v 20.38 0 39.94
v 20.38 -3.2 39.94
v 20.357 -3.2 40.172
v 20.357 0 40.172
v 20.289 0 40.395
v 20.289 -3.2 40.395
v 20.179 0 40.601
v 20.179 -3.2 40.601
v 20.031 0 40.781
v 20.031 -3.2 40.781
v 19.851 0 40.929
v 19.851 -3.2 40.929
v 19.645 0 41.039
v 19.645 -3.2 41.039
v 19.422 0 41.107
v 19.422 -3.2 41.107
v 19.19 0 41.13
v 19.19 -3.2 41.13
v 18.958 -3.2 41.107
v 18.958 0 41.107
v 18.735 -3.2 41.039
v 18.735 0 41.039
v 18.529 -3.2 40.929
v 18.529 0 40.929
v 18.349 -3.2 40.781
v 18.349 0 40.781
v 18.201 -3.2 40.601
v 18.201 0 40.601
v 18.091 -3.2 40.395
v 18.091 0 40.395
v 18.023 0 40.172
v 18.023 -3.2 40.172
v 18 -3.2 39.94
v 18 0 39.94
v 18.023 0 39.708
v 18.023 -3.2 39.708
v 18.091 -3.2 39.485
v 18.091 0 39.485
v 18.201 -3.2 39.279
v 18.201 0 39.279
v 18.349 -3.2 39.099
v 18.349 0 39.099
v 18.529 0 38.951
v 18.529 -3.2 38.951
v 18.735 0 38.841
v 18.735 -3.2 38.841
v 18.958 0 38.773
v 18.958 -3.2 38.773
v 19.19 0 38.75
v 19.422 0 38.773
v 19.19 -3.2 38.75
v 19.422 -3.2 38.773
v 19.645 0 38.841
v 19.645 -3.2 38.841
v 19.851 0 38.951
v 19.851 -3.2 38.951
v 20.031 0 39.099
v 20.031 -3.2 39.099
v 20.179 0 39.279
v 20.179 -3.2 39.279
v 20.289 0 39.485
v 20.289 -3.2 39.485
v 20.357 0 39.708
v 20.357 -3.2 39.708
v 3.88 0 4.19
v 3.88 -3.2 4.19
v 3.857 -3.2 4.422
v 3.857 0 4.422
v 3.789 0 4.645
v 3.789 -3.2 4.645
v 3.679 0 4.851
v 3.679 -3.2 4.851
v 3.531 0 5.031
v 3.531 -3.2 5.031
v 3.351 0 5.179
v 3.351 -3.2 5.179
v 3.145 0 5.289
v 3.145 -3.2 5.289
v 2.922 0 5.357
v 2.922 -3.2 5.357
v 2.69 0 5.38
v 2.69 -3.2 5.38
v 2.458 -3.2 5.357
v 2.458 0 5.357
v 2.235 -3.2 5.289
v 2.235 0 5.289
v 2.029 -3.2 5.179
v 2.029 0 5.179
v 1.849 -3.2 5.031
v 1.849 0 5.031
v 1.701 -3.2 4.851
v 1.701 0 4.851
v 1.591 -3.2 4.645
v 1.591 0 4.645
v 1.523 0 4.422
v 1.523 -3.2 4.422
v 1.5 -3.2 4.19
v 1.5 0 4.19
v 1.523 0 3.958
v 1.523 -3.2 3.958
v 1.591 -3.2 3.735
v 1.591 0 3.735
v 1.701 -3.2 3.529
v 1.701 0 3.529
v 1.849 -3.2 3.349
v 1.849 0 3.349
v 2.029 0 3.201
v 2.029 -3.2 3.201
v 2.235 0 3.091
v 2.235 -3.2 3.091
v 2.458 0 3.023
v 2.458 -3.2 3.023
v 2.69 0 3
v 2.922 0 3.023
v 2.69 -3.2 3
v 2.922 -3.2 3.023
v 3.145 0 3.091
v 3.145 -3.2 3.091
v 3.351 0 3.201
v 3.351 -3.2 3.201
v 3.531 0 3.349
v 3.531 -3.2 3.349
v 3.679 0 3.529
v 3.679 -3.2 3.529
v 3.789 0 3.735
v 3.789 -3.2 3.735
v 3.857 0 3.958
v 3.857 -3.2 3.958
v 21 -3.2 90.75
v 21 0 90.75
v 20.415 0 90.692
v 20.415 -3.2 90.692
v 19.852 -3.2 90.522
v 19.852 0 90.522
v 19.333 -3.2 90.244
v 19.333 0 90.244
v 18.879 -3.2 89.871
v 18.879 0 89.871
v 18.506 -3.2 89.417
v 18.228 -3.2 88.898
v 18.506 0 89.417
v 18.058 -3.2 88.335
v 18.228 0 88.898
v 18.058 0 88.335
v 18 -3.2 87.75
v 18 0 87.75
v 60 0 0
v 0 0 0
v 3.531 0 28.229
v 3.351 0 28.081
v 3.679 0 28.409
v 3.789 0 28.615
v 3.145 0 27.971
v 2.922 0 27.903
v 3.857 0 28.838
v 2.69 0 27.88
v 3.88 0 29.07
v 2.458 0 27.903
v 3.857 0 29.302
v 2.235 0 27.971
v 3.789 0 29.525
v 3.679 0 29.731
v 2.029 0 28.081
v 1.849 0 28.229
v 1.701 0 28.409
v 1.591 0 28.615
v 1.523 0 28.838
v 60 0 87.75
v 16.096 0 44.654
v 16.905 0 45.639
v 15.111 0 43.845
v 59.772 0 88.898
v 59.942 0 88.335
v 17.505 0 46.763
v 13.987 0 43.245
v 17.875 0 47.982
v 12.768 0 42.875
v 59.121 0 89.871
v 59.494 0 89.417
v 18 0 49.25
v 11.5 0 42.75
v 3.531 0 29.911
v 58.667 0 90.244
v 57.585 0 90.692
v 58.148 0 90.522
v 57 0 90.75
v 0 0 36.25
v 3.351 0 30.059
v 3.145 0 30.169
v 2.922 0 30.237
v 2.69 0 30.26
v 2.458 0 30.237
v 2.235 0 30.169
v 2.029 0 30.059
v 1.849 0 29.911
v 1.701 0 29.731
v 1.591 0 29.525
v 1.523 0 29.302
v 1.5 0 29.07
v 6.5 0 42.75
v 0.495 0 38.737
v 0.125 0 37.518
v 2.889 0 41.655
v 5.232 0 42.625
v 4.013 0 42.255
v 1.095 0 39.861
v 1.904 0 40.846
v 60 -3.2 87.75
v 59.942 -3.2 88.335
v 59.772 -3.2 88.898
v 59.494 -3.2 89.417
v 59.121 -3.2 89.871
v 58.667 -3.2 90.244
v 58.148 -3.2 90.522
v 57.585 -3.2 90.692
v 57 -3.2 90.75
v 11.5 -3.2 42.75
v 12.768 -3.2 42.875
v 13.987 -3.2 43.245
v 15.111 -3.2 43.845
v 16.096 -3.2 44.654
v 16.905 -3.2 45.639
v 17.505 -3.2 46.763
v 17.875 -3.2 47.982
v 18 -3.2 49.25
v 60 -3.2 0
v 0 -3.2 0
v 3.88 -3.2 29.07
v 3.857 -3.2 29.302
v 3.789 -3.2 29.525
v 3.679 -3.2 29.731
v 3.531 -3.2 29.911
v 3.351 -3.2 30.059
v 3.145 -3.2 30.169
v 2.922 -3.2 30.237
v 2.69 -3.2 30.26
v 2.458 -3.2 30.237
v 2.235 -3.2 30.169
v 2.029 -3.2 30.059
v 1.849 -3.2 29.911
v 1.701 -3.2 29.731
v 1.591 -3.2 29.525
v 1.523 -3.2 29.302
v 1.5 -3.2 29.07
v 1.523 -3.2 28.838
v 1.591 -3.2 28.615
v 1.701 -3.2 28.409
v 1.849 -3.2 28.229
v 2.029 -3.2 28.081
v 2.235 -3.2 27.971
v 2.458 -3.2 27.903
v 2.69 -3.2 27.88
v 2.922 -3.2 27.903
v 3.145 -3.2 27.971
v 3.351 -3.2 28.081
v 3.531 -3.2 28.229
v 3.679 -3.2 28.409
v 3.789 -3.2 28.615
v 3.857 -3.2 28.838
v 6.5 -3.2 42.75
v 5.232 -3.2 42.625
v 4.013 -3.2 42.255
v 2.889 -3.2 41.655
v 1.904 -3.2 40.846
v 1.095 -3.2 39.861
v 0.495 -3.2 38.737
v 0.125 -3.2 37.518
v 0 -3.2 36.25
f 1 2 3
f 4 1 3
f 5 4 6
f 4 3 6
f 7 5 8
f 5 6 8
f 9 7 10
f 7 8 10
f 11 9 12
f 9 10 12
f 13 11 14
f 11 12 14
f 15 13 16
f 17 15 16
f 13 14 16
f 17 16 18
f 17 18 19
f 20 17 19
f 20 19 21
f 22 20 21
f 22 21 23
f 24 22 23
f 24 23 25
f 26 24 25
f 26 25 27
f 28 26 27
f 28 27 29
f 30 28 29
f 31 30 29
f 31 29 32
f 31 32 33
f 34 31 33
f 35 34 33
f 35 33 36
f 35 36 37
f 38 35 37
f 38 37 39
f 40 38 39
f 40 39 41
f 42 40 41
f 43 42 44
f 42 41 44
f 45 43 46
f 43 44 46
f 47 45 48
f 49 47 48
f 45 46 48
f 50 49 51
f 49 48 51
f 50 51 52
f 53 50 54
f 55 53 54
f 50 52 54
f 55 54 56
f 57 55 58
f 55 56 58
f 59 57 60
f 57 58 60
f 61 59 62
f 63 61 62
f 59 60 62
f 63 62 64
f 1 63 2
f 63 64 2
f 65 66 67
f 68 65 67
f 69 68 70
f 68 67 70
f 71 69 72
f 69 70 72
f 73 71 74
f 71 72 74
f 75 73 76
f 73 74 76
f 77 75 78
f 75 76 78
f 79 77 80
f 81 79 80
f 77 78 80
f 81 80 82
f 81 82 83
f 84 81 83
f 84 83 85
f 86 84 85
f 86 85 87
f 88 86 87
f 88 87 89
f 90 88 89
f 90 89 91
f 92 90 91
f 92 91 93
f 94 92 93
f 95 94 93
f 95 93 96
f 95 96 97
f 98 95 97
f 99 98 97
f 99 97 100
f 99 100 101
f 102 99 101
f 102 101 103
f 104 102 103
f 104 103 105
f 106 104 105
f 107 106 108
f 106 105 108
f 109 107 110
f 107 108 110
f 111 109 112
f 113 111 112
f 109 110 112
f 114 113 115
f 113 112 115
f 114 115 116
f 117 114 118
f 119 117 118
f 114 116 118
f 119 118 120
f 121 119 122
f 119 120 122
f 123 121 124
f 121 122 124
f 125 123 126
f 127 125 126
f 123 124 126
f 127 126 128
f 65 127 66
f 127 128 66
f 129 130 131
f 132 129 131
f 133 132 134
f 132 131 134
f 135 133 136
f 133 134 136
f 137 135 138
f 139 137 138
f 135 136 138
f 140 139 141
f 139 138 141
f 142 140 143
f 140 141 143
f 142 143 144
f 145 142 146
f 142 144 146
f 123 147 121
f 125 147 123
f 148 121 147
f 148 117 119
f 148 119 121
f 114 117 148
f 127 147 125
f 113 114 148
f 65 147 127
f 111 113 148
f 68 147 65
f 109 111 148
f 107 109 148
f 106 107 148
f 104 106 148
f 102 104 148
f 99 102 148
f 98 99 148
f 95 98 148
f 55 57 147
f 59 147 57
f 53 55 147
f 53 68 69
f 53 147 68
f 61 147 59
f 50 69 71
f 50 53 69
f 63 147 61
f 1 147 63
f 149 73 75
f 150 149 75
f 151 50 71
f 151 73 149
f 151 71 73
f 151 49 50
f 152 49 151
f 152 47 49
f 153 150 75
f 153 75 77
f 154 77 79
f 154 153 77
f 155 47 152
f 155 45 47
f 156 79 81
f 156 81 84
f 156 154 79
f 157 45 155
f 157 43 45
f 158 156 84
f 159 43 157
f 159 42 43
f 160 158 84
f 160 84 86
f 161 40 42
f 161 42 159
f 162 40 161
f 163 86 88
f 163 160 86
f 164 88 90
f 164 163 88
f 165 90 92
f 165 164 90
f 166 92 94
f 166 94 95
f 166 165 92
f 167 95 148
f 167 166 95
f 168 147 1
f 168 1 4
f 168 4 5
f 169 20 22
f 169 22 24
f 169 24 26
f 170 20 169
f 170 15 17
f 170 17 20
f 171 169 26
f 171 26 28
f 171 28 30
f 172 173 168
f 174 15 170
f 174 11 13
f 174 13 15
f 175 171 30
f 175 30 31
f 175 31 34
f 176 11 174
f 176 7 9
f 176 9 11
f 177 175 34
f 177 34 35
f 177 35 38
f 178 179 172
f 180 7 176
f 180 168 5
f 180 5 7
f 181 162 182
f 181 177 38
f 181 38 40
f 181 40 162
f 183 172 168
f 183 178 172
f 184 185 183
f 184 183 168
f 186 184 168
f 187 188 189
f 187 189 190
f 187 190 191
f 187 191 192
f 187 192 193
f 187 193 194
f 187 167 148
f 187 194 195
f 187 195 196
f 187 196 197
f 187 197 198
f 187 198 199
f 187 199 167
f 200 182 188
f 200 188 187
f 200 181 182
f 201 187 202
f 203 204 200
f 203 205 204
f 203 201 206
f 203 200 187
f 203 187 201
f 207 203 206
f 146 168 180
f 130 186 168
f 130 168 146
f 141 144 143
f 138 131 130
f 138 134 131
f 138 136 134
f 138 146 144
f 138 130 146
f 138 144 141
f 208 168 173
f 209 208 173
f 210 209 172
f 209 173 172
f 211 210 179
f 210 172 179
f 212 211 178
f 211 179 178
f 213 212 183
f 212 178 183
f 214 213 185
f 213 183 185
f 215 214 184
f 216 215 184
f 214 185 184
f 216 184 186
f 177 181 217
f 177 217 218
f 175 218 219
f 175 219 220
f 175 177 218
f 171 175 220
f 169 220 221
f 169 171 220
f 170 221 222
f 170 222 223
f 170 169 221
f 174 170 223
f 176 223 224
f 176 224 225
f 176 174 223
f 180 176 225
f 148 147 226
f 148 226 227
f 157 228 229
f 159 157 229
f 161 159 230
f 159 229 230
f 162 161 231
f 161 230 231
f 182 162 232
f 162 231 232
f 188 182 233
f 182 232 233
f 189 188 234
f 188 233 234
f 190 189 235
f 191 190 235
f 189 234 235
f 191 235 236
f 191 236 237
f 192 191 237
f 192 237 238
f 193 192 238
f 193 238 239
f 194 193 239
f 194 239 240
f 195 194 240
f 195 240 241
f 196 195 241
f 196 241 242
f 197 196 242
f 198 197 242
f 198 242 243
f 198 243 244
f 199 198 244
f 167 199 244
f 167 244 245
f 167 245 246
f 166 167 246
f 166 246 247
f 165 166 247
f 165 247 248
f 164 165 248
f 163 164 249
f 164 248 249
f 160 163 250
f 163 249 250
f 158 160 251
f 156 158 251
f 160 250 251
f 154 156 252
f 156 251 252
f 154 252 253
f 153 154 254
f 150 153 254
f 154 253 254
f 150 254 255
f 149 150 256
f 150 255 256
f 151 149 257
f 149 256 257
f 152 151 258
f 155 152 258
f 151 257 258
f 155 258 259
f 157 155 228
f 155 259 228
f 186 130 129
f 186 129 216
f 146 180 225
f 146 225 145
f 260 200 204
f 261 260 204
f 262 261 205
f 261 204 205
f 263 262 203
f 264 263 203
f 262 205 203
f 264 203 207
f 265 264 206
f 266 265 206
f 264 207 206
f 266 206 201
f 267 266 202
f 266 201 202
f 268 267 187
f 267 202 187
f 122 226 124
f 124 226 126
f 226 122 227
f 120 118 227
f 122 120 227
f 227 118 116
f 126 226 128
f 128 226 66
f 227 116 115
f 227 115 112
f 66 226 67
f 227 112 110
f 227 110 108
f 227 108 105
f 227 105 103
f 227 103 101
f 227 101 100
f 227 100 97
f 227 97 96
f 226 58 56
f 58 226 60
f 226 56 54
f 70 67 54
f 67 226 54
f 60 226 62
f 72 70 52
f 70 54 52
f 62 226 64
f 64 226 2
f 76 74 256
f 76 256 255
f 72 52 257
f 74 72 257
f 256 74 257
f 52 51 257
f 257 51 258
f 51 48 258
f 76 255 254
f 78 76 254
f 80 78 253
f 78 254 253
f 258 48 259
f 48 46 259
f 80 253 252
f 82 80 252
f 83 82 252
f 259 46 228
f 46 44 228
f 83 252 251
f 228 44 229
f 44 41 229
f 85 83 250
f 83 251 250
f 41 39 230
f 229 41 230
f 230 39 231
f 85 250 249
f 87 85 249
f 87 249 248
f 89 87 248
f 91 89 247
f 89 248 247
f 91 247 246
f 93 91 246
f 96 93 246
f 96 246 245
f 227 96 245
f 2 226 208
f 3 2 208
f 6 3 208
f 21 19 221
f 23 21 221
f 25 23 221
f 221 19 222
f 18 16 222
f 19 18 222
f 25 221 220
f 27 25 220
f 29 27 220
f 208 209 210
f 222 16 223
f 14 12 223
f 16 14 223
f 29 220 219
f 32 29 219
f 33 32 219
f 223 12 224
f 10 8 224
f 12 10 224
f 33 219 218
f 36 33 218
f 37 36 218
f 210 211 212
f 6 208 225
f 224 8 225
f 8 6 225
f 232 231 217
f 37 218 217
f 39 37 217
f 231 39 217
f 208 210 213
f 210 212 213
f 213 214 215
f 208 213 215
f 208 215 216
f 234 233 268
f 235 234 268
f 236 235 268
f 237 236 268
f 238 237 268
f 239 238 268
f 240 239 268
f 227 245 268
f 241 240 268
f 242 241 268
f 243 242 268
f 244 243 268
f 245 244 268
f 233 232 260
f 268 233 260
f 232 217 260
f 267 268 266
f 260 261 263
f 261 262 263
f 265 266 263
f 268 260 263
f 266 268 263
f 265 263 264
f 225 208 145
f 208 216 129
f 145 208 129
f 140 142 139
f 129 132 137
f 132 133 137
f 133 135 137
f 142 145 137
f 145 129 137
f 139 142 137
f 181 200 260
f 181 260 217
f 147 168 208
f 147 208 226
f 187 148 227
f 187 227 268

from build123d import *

# Parameters (mm, degrees)
PAD_DEPTH    = 3.2
SKETCH001_R  = 1.19
POCKET_DEPTH = 3.201


with BuildPart() as part:
    # Sketch → Pad (new body)
    with BuildSketch(Plane.XZ):
        with BuildLine():
            Line((60, 0), (0, 0))
            Line((0, 0), (0, 36.25))
            ThreePointArc((6.5, 42.75), (1.903806, 40.846194), (0, 36.25))
            Line((6.5, 42.75), (11.5, 42.75))
            ThreePointArc((11.5, 42.75), (16.096194, 44.653806), (18, 49.25))
            Line((18, 49.25), (18, 87.75))
            ThreePointArc((21, 90.75), (18.87868, 89.87132), (18, 87.75))
            Line((21, 90.75), (57, 90.75))
            ThreePointArc((60, 87.75), (59.12132, 89.87132), (57, 90.75))
            Line((60, 87.75), (60, 0))
        make_face()
    extrude(amount=PAD_DEPTH)

    # Sketch001 (on Face12 of Pad) → Pocket (cut, through all)
    with BuildSketch(Plane.XZ.offset(3.2)):
        with Locations((19.19, 39.94)):
            Circle(SKETCH001_R)
        with Locations((2.69, 29.07)):
            Circle(SKETCH001_R)
        with Locations((2.69, 4.19)):
            Circle(SKETCH001_R)
    extrude(amount=-POCKET_DEPTH, mode=Mode.SUBTRACT)


solid = part.part
